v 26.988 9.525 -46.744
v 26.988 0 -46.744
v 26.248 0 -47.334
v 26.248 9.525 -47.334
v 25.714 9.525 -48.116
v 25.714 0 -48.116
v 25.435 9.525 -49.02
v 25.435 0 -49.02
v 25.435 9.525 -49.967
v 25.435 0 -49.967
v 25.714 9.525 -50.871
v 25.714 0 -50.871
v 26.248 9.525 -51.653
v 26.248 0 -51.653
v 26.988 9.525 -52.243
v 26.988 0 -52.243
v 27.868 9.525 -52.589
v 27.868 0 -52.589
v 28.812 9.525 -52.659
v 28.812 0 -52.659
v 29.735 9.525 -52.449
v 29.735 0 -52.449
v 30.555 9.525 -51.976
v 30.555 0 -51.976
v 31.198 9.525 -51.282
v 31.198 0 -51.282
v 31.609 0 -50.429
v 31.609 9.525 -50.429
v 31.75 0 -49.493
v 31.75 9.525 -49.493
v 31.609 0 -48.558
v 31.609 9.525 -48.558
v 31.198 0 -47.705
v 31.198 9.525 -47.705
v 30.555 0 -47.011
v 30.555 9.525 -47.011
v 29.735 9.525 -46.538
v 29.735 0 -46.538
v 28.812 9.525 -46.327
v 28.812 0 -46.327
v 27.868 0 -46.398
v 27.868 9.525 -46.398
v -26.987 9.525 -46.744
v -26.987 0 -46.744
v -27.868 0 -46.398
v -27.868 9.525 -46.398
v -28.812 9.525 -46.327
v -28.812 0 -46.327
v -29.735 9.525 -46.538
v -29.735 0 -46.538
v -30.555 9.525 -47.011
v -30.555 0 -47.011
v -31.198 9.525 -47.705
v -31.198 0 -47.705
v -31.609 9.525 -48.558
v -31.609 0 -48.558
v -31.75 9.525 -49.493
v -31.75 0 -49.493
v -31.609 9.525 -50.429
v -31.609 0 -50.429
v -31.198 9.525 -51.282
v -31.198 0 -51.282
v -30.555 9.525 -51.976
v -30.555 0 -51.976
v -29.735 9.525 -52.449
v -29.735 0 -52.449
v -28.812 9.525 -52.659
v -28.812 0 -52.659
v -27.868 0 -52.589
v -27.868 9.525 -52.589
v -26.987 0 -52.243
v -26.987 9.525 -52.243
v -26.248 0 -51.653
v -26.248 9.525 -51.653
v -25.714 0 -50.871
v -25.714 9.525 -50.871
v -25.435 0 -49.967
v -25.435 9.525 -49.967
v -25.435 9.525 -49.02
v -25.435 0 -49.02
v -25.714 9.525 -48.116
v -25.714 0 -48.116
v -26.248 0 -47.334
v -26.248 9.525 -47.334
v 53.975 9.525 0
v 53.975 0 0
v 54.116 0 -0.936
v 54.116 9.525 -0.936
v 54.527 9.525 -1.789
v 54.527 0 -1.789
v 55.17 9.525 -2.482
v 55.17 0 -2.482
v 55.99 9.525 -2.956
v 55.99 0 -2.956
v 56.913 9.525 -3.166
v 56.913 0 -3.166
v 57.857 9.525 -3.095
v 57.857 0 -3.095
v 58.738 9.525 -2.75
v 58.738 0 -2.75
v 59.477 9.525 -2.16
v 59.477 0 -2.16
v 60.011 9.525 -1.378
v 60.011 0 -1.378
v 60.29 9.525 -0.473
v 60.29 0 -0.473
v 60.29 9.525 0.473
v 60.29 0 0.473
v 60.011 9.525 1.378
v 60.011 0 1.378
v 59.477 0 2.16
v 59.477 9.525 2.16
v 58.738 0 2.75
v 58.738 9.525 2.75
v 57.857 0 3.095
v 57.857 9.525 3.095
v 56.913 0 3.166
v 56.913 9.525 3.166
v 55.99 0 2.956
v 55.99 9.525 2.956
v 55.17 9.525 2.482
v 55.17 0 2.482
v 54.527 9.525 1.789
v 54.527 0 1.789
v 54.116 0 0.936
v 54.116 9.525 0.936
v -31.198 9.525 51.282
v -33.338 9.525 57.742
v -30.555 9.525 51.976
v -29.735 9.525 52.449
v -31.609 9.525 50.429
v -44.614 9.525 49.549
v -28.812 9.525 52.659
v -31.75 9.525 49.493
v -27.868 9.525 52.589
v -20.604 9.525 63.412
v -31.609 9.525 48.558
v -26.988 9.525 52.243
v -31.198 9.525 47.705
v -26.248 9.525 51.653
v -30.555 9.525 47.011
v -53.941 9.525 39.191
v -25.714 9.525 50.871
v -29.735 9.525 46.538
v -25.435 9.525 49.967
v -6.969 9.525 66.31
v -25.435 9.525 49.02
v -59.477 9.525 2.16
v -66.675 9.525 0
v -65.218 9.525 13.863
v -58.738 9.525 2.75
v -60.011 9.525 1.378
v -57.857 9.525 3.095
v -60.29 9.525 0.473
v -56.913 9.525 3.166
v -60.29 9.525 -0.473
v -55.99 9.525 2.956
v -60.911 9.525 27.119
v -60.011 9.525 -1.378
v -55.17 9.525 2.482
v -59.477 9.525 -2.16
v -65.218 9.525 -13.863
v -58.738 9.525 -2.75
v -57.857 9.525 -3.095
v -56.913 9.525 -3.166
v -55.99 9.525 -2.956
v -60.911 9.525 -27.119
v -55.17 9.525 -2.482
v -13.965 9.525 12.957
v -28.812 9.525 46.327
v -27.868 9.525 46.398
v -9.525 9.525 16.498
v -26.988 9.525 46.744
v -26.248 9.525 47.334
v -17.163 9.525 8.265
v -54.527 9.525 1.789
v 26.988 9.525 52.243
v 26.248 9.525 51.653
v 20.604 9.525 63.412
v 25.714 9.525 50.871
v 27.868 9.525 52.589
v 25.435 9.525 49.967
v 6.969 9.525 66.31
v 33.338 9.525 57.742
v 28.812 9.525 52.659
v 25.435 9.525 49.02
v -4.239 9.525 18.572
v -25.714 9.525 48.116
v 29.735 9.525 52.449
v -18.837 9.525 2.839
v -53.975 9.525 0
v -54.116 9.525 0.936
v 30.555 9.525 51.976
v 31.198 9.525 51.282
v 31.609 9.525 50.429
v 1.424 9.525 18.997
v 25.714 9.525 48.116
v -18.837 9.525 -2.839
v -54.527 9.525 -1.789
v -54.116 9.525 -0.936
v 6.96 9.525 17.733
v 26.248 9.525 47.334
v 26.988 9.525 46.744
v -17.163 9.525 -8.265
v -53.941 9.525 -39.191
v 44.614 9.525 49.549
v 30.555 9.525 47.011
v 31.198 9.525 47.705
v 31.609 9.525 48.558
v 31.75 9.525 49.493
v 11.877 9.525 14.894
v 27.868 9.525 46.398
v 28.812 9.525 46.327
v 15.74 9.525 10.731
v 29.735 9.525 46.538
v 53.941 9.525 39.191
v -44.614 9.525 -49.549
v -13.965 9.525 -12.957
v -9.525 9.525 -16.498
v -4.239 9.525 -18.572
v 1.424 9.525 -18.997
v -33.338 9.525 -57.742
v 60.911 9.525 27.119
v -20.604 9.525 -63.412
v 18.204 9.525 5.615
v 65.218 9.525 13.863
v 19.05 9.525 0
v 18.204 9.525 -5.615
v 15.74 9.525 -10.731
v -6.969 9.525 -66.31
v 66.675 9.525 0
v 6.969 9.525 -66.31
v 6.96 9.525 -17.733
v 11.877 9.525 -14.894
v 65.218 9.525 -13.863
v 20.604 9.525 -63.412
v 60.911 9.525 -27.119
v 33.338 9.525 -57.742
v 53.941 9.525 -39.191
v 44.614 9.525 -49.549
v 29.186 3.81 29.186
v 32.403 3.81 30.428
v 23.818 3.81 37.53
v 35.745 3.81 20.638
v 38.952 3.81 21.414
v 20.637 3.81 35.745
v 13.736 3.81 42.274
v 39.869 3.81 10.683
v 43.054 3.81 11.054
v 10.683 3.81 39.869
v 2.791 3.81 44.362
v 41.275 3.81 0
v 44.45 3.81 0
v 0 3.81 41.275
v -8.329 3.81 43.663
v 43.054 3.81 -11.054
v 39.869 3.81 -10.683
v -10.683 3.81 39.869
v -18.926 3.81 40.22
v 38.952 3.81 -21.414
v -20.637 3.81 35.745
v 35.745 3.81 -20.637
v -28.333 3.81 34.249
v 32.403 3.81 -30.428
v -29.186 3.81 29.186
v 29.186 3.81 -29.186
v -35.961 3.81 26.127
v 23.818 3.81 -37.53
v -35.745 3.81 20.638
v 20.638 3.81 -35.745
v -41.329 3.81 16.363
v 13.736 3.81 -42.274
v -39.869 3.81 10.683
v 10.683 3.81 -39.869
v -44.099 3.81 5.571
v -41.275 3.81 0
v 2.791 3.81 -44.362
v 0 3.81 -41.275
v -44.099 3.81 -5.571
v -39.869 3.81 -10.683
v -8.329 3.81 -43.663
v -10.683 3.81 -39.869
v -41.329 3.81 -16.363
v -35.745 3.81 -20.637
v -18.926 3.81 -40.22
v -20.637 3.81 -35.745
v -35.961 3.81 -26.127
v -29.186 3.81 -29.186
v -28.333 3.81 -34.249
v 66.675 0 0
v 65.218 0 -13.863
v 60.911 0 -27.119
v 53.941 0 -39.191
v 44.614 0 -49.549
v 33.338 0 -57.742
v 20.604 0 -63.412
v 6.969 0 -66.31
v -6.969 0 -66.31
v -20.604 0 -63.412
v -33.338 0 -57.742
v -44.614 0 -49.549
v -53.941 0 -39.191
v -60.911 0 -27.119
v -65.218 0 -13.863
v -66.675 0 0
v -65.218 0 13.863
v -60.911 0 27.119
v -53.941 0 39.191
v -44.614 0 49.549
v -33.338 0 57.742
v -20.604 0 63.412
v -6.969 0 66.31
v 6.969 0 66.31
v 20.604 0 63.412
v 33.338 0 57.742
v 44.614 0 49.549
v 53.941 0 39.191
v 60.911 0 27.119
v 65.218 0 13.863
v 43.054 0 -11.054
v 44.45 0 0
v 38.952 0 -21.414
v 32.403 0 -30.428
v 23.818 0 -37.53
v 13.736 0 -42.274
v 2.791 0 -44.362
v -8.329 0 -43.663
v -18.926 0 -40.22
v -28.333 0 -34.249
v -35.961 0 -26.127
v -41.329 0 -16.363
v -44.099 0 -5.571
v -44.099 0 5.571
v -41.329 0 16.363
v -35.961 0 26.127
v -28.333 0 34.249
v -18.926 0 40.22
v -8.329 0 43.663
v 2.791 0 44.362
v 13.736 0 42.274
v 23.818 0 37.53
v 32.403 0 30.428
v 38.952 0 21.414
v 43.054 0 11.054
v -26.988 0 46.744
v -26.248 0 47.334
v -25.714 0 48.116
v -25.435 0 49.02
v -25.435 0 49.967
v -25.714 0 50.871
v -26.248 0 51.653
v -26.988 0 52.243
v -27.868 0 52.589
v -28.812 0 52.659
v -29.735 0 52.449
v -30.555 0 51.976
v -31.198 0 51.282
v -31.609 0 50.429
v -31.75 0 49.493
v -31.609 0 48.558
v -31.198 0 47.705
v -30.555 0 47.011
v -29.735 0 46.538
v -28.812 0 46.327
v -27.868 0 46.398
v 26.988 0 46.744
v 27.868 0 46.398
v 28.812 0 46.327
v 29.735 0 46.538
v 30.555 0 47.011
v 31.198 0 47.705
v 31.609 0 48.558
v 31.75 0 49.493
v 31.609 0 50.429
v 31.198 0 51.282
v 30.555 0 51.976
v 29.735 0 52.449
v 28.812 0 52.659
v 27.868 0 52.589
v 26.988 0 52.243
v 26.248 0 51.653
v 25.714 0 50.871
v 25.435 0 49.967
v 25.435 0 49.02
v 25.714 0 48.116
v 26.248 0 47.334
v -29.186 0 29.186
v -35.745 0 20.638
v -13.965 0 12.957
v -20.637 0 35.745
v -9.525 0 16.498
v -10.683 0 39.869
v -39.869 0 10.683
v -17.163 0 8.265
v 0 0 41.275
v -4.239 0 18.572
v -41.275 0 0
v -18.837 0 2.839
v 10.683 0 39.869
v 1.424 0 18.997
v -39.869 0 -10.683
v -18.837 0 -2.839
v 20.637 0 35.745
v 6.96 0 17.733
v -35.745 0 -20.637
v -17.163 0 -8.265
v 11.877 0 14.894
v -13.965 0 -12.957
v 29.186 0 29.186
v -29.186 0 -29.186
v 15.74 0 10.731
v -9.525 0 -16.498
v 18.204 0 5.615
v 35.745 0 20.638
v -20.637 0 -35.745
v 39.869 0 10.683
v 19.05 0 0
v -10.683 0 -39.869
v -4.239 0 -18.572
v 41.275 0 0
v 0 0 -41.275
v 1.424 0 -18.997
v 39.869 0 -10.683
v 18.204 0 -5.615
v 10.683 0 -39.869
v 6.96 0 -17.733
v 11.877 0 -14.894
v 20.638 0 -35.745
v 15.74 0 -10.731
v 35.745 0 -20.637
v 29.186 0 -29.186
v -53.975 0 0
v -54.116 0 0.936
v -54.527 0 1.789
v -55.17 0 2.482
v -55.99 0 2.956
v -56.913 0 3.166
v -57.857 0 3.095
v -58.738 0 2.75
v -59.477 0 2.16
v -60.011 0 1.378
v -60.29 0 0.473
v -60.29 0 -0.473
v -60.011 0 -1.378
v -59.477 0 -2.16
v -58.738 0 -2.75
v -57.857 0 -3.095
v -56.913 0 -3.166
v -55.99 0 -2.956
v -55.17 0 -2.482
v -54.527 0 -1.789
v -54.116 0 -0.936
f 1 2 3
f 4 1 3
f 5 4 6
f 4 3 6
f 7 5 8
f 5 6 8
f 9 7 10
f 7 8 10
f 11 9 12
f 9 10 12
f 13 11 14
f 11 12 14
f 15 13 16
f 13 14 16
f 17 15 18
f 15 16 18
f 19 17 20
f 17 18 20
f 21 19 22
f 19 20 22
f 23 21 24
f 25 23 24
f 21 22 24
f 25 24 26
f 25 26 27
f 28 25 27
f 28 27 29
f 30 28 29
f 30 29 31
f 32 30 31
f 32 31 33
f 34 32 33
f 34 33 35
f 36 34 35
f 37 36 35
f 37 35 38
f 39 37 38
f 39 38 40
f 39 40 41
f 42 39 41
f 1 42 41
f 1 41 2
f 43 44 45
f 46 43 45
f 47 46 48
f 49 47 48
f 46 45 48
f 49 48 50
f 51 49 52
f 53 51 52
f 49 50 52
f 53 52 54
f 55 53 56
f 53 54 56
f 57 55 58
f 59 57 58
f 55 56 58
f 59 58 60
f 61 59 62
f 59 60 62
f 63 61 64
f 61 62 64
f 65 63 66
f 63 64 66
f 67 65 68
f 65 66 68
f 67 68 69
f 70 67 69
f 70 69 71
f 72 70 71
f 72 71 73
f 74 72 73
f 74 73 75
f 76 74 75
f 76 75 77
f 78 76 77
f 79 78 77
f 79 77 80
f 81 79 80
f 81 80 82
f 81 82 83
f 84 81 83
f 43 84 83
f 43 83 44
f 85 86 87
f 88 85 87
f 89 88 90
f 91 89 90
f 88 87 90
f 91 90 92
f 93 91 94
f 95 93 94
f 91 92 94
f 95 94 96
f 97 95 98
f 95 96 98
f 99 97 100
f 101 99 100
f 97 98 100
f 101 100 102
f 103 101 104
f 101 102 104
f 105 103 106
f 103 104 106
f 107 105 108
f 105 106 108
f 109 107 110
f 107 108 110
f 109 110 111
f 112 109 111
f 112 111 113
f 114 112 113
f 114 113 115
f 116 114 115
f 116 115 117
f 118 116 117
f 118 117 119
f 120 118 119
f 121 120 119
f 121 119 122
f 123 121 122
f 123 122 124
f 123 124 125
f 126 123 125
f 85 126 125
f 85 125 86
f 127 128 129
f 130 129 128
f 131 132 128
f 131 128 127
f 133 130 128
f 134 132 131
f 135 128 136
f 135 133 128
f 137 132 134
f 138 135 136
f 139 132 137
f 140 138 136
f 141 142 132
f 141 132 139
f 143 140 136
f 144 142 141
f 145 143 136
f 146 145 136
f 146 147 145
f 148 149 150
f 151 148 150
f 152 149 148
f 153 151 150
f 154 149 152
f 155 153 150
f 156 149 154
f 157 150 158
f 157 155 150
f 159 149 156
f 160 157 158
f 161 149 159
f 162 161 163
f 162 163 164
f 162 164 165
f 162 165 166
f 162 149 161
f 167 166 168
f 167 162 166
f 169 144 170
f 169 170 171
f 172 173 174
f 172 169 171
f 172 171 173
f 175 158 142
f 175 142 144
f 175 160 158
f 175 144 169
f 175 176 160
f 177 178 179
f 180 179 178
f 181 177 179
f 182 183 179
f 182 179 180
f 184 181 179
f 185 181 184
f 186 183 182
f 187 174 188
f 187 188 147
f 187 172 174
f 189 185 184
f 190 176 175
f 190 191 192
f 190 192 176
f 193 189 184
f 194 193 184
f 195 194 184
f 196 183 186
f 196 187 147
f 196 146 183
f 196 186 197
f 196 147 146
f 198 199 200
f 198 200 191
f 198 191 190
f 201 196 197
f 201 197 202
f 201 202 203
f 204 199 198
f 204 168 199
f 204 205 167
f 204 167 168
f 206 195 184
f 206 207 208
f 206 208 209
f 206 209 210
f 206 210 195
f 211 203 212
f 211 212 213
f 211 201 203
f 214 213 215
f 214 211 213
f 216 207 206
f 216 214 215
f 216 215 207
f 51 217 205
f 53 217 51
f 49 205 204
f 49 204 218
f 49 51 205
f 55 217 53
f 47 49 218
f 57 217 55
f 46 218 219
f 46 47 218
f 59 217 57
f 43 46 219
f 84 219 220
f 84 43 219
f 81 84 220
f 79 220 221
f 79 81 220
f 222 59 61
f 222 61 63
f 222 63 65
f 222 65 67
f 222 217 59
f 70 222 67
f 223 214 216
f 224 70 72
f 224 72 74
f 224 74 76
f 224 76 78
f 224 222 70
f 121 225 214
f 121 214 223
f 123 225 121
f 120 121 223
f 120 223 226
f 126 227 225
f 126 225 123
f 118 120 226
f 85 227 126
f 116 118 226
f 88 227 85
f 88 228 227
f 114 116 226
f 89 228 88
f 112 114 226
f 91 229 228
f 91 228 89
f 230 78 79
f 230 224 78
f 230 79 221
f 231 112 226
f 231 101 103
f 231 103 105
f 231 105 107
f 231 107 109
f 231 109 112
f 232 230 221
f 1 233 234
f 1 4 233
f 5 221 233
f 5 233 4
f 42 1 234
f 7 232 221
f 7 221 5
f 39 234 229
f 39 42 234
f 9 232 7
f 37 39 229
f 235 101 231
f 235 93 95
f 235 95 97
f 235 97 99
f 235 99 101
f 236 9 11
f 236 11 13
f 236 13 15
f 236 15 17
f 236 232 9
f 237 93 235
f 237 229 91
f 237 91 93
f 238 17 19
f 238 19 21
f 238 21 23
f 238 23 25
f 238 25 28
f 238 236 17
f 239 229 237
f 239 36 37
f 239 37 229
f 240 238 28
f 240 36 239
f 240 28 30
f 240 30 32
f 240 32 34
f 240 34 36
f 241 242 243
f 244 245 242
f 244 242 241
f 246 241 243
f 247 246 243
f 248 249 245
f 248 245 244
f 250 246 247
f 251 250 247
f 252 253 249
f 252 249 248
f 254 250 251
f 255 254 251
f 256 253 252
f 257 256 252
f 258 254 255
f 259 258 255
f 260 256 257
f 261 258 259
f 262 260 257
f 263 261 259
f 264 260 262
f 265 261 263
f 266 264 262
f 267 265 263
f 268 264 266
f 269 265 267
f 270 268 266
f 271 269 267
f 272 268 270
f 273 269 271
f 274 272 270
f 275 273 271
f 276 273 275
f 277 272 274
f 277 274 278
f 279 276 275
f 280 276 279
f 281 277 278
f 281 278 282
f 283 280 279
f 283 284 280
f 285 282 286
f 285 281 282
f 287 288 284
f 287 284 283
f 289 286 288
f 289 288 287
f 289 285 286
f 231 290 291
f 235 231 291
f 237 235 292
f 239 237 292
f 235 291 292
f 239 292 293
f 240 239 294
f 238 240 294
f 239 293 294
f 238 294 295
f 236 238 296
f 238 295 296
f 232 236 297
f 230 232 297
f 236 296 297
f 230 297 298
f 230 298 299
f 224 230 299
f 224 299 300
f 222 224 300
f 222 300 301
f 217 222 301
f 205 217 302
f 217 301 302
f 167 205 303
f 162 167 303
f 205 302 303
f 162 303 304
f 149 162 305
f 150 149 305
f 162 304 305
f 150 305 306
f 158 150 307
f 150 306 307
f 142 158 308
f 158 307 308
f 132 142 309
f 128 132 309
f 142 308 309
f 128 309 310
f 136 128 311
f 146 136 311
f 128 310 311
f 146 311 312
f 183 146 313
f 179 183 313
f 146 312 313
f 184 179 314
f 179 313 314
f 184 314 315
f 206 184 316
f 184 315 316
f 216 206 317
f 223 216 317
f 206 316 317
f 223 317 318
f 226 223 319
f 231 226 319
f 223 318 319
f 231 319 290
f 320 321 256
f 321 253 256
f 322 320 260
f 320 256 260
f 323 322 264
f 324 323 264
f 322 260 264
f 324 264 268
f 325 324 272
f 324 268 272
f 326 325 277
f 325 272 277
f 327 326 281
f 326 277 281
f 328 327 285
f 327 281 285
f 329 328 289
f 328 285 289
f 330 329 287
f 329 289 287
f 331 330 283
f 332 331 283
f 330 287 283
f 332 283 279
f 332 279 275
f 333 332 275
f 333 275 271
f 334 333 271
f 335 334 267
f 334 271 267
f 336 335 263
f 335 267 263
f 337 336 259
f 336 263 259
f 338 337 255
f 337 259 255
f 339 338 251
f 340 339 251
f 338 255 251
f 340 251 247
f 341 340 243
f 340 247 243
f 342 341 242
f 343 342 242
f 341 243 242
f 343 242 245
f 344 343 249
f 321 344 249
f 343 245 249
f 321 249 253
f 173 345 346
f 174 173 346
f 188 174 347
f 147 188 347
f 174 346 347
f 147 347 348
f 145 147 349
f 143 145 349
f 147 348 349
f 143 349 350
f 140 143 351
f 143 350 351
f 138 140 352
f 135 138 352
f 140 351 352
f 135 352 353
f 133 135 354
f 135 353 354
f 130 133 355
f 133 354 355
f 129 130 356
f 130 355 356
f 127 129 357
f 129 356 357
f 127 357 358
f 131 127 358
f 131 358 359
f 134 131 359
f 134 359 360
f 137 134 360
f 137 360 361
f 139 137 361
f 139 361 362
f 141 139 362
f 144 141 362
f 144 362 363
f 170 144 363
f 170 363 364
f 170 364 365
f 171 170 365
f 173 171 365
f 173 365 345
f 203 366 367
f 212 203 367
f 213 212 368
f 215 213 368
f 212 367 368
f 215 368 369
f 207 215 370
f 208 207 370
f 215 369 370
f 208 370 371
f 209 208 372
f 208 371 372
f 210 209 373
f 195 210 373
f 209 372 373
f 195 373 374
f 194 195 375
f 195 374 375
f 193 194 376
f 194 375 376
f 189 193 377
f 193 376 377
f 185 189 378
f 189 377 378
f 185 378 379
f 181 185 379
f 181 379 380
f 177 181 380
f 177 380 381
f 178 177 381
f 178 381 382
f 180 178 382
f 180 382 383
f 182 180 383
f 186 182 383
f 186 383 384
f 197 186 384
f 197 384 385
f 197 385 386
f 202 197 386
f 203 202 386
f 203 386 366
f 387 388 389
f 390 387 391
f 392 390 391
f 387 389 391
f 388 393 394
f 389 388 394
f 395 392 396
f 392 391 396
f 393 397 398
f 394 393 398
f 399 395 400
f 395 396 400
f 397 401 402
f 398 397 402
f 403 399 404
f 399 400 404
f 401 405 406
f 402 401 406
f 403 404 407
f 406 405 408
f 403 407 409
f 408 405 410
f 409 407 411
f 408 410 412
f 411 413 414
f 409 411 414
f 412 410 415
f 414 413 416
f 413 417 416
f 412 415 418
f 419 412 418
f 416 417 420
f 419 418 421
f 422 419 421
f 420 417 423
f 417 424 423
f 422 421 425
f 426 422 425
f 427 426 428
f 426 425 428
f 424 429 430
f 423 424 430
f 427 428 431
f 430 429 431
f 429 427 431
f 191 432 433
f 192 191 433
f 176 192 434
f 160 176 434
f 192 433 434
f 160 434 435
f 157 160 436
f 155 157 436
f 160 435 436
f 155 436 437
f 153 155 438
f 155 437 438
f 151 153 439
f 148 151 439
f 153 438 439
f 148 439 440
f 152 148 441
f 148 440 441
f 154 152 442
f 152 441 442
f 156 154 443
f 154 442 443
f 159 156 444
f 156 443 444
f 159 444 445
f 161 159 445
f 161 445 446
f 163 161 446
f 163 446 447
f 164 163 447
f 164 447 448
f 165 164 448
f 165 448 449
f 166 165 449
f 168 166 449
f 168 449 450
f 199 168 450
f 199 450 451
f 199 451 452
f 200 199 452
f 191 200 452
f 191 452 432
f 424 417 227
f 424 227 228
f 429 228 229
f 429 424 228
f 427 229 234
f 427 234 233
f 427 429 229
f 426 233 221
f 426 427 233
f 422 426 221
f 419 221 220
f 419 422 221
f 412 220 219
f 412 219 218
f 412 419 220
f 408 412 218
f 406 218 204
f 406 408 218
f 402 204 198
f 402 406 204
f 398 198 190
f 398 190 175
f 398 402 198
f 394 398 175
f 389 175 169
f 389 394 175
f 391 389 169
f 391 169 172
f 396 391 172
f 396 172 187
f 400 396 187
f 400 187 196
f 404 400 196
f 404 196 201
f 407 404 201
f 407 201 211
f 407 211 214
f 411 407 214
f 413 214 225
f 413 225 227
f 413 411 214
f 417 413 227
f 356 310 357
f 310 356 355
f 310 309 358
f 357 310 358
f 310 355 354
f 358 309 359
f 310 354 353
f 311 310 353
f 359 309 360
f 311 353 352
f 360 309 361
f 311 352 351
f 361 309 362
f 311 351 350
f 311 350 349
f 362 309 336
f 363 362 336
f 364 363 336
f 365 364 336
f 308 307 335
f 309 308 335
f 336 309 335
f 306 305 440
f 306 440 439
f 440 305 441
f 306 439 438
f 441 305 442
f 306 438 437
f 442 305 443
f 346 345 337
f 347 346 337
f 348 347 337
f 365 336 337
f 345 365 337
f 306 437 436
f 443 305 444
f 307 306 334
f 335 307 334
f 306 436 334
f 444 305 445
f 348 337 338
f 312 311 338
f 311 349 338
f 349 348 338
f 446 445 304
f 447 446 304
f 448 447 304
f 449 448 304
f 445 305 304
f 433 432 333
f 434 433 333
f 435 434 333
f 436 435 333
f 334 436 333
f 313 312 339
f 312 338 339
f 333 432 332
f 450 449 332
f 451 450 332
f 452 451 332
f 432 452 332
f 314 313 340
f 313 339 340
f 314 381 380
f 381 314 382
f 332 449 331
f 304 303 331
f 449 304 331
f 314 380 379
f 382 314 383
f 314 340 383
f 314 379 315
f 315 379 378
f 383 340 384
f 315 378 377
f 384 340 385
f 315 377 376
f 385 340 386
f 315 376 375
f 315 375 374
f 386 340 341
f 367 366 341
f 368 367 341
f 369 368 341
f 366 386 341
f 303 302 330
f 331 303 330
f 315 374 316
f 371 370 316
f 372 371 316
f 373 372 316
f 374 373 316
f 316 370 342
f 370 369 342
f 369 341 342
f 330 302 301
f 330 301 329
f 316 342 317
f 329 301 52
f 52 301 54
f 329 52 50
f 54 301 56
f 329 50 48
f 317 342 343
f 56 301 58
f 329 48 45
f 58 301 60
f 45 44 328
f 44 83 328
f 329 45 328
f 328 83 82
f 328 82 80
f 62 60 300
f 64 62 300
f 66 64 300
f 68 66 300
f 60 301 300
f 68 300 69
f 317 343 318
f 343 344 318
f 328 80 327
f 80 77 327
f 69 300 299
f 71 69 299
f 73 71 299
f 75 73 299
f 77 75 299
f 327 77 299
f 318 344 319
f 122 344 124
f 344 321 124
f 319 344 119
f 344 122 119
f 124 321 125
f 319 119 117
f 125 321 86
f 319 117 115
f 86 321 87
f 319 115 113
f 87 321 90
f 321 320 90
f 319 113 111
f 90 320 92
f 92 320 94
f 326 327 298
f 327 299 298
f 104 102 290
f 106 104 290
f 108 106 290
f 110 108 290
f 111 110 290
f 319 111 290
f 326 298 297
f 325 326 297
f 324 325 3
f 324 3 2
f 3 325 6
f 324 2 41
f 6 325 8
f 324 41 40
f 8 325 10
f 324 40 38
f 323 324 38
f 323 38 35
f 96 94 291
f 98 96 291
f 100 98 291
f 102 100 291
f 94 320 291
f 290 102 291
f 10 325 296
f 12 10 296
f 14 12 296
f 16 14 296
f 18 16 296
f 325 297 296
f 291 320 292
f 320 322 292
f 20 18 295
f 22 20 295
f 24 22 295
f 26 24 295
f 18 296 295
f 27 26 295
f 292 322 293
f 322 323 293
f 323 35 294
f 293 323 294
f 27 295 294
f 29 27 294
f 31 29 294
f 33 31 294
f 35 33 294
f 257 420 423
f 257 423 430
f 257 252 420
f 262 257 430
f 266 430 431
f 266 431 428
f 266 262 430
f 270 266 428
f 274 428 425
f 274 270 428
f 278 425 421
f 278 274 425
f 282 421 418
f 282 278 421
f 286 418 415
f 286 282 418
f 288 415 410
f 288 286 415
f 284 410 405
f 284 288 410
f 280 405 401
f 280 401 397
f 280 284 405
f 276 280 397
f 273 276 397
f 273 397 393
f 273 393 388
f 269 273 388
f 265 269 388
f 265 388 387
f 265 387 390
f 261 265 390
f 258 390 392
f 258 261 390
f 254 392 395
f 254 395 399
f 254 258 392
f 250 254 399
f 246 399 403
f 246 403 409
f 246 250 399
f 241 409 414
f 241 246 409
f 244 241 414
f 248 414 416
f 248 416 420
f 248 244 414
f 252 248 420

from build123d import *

# Parameters (mm, degrees)
SKETCH1_R                       = 66.675
SKETCH1_R_2                     = 19.05
BOSS_EXTRUDE1_DEPTH             = 9.525
SKETCH2_W                       = 3.175
SKETCH2_H                       = 3.81
F_1_4_0_25_DIAMETER_HOLE1_D     = 6.35
F_1_4_0_25_DIAMETER_HOLE1_DEPTH = 9.526
CIRPATTERN1_COUNT               = 6


with BuildPart() as part:
    # Sketch1 → Boss-Extrude1 (new body)
    with BuildSketch(Plane(origin=(0, 0, 0), x_dir=(1, 0, 0), z_dir=(0, 1, 0))):
        Circle(SKETCH1_R)
        Circle(SKETCH1_R_2, mode=Mode.SUBTRACT)
    extrude(amount=BOSS_EXTRUDE1_DEPTH)

    # Sketch2 → Cut-Revolve1 (revolve, cut)
    with BuildSketch(Plane.XY):
        with Locations((42.8625, 1.905)):
            Rectangle(SKETCH2_W, SKETCH2_H)
    revolve(axis=Axis((0, -0.47625, 0), (0, 1, 0)), mode=Mode.SUBTRACT)

    # 1/4 (0.25) Diameter Hole1
    with Locations(Plane(origin=(0, 9.525, 0), x_dir=(1, 0, 0), z_dir=(0, 1, 0))):
        with Locations((57.15, 0)):
            f_1_4_0_25_diameter_hole1 = Hole(F_1_4_0_25_DIAMETER_HOLE1_D / 2, depth=F_1_4_0_25_DIAMETER_HOLE1_DEPTH)

    # CirPattern1: 1/4 (0.25) Diameter Hole1 ×6 about axis
    cirpattern1_axis = Axis((0, 0, 0), (0, 1, 0))
    for i in range(1, CIRPATTERN1_COUNT):
        add(f_1_4_0_25_diameter_hole1.rotate(cirpattern1_axis, i * 360 / CIRPATTERN1_COUNT), mode=Mode.SUBTRACT)


solid = part.part
